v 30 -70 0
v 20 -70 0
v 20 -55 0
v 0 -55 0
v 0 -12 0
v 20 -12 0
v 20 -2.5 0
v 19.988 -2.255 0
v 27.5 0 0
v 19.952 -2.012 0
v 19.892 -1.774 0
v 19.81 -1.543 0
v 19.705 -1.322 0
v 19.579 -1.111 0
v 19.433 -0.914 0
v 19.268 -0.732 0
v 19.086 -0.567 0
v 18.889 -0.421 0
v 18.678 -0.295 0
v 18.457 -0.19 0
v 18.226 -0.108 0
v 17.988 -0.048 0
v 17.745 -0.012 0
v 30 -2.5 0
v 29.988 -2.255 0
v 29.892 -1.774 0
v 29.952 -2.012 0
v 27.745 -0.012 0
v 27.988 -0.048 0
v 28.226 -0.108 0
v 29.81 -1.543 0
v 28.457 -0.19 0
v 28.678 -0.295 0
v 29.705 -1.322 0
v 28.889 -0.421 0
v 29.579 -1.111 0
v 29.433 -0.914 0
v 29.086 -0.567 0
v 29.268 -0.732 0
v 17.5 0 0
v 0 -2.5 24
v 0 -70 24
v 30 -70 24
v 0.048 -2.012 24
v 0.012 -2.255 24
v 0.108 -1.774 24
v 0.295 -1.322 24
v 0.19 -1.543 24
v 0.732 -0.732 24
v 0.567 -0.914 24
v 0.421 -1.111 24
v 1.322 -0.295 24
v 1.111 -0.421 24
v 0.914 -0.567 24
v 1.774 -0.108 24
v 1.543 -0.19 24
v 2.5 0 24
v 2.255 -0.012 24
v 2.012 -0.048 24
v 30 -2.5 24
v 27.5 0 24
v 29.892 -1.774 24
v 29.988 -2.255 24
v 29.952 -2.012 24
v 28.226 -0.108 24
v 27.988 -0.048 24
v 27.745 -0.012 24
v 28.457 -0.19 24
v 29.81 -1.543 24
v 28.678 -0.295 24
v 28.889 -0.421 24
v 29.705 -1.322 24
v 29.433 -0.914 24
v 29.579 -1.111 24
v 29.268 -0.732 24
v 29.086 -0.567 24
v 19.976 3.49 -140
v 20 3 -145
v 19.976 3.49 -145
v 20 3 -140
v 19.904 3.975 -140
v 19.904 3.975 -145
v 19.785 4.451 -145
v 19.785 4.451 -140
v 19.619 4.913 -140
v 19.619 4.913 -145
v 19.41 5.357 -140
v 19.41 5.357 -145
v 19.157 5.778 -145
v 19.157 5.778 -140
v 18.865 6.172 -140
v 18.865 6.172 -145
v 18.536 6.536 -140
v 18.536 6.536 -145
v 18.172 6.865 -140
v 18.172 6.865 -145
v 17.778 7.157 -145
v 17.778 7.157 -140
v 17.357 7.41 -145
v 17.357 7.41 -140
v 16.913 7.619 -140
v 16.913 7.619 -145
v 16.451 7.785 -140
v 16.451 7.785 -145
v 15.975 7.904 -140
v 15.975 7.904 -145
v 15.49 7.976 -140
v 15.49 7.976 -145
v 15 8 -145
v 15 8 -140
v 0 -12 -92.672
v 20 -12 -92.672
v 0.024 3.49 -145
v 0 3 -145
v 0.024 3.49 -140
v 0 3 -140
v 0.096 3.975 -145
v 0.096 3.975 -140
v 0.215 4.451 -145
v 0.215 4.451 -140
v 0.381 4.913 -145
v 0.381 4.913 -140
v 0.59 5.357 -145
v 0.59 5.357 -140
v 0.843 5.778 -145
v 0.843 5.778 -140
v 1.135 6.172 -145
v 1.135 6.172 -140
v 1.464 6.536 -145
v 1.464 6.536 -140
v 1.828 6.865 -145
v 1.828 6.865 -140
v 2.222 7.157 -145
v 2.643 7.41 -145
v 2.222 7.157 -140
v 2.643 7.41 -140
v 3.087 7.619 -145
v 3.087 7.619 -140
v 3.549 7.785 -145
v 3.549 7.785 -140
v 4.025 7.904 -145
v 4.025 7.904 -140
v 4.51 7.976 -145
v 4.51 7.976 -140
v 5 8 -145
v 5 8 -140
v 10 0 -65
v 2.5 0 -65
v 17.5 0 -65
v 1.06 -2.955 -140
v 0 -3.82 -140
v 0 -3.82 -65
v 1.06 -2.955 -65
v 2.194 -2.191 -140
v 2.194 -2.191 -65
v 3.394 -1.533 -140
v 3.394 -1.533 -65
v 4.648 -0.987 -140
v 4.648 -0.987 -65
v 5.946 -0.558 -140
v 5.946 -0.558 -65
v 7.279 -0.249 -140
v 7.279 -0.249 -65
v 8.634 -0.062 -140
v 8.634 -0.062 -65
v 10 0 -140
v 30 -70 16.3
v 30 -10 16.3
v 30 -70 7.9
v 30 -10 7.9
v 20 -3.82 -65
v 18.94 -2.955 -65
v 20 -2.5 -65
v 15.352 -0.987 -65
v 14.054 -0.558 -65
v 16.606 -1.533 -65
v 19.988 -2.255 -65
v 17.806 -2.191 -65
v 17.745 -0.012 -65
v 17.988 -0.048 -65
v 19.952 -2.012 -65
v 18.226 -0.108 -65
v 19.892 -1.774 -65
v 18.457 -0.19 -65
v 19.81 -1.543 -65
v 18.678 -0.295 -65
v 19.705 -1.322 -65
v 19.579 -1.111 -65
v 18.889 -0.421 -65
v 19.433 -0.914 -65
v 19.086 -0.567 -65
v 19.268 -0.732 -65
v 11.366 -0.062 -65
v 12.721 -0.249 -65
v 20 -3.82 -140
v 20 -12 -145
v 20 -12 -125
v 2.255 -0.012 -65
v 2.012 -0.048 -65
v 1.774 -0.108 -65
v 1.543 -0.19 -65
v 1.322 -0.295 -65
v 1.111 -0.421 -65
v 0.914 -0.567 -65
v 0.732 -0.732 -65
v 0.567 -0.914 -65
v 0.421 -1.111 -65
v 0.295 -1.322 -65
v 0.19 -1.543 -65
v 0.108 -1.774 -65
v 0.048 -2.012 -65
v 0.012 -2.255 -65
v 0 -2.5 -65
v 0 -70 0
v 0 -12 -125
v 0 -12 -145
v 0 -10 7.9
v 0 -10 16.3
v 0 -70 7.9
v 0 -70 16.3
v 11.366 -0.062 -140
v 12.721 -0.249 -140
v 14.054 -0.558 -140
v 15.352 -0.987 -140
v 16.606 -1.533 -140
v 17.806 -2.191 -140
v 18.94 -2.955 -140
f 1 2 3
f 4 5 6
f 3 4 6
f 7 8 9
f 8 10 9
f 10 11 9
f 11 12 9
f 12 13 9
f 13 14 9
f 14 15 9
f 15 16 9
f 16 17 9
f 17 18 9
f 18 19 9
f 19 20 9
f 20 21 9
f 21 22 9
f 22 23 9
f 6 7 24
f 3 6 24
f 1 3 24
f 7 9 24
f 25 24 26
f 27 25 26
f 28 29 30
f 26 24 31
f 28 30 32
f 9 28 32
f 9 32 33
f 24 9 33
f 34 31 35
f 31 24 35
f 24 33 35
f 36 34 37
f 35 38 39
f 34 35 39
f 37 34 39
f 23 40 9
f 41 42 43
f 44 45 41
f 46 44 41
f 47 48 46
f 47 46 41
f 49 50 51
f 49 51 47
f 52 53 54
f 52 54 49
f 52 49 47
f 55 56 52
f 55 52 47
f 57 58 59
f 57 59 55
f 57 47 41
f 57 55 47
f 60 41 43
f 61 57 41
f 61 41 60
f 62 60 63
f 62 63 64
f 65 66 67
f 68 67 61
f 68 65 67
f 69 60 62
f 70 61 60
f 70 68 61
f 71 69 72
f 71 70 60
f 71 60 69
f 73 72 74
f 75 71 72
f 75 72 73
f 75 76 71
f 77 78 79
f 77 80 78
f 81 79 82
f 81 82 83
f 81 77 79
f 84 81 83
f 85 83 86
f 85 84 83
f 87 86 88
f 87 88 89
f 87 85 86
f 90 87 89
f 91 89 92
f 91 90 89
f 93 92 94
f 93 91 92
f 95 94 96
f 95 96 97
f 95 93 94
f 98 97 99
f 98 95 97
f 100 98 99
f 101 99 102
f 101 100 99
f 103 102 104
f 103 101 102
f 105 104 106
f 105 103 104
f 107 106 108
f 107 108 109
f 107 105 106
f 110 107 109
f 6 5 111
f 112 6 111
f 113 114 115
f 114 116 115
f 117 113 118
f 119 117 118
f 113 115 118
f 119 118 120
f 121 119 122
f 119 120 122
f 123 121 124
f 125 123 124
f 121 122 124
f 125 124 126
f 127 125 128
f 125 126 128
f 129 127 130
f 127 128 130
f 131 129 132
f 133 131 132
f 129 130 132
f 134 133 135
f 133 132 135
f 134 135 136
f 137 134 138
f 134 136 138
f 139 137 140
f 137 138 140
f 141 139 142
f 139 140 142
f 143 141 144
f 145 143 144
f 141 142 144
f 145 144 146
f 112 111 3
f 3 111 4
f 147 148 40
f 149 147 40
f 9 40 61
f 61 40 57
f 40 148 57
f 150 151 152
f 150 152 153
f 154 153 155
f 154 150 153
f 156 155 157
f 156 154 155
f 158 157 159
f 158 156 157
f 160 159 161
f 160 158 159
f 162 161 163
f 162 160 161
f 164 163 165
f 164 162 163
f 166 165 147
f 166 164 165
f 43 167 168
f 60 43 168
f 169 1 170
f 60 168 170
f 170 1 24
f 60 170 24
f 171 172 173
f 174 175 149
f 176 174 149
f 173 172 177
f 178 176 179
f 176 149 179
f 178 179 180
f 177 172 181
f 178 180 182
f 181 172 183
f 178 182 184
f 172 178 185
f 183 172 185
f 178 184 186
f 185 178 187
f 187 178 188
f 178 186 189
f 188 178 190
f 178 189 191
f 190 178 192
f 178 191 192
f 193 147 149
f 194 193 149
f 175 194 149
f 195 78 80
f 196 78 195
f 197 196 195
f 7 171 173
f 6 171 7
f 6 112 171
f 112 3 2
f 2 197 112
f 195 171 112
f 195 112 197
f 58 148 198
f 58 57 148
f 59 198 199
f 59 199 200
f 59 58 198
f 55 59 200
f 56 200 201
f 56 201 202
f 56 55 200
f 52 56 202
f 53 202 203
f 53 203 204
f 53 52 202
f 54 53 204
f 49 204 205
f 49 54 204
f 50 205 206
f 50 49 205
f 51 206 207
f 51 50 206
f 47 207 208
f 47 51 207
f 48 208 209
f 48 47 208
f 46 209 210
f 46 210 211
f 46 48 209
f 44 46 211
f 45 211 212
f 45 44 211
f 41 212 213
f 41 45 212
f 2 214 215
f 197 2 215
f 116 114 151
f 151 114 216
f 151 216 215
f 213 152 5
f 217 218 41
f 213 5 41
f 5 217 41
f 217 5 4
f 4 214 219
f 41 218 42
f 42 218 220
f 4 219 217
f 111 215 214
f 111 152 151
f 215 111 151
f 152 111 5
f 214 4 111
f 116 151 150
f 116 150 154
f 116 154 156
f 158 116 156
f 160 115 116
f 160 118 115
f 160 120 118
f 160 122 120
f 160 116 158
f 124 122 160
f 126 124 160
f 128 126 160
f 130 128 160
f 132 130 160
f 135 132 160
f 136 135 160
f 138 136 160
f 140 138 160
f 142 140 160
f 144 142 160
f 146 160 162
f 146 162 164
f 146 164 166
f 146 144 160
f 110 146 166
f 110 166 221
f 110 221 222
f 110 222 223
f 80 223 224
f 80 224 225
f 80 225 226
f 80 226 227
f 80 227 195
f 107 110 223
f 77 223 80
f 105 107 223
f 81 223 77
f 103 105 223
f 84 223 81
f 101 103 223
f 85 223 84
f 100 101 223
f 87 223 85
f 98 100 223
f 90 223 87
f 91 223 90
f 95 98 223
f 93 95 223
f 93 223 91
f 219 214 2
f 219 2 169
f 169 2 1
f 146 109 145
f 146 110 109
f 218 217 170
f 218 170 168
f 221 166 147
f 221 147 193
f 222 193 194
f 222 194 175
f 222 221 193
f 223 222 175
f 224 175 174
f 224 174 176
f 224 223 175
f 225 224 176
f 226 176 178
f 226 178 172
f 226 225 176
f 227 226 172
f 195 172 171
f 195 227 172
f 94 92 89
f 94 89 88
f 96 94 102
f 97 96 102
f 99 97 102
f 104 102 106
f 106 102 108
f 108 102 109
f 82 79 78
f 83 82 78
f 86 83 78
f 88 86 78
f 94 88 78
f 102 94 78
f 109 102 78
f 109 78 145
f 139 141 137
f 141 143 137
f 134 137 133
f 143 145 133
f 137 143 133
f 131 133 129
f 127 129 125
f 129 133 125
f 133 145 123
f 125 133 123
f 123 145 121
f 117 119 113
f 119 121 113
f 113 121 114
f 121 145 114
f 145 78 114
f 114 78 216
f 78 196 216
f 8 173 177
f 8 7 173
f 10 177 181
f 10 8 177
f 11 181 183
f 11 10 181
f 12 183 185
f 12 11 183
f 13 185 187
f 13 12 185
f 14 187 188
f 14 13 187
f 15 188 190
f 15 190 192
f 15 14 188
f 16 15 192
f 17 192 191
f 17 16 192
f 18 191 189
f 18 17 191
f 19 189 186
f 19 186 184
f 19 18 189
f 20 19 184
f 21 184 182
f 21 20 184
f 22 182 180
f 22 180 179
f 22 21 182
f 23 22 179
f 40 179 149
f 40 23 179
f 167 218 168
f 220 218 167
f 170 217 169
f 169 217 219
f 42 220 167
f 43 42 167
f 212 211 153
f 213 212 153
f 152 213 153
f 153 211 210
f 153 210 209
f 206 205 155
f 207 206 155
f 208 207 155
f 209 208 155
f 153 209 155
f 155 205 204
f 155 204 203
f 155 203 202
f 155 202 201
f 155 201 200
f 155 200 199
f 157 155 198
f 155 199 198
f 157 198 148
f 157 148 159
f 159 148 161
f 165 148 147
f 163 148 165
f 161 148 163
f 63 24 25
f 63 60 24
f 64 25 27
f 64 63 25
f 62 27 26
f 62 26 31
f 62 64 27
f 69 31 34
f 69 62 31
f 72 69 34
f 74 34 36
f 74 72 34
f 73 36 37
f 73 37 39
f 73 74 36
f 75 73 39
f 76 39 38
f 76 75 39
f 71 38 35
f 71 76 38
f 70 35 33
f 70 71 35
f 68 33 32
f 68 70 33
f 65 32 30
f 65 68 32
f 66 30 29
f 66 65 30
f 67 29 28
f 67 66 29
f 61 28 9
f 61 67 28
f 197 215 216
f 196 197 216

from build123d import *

# Parameters (mm, degrees)
F0_W     = 30
F0_H     = 70
F1_DEPTH = 24
F2_W     = 60
F2_H     = 8.4
F3_DEPTH = 30.001
F5_DEPTH = 20
F6_W     = 20
F6_H     = 5
F7_DEPTH = 8
F9_DEPTH = 75
F10_R    = 5
F11_R    = 2.5
F12_R    = 2.5


with BuildPart() as f1:
    # F0 (on Top) → F1 (new body)
    with BuildSketch(Plane.XY):
        with Locations((15, -35)):
            Rectangle(F0_W, F0_H)
    extrude(amount=F1_DEPTH)

    # F2 (on face) → F3 (cut, through all)
    with BuildSketch(Plane(origin=(0, 0, 0), x_dir=(0, -1, 0), z_dir=(-1, 0, 0))):
        with Locations((40, 12.1)):
            Rectangle(F2_W, F2_H)
    extrude(amount=-F3_DEPTH, mode=Mode.SUBTRACT)

    # F4 (on Right) → F5 (join)
    with BuildSketch(Plane.YZ):
        Polygon((0, -145), (0, 0), (-12, 0), (-12, -92.6724137931), (-12, -125), (-12, -145), align=None)
        Polygon((-12, -125), (-12, -92.6724137931), (-55, 0), (-70, 0), align=None)
    extrude(amount=F5_DEPTH)

    # F6 (on face) → F7 (join)
    with BuildSketch(Plane(origin=(0, 0, 0), x_dir=(-1, 0, 0), z_dir=(0, 1, 0))):
        with Locations((-10, -142.5)):
            Rectangle(F6_W, F6_H)
    extrude(amount=F7_DEPTH)

    # F8 (on face) → F9 (cut)
    with BuildSketch(Plane.XY.offset(-140)):
        with BuildLine():
            ThreePointArc((0, -3.8196601125), (4.647668654, -0.9874146153), (10.0000000012, 0))
            Line((10.0000000012, 0), (0, 0))
            Line((0, 0), (0, -3.8196601125))
        make_face()
        with BuildLine():
            ThreePointArc((10.0000000012, 0), (15.6425875311, -1.1017552924), (20.4562749714, -4.2451725387))
            Line((20.4562749714, -4.2451725387), (20.4562749714, 0))
            Line((20.4562749714, 0), (20, 0))
            Line((20, 0), (10.0000000012, 0))
        make_face()
    extrude(amount=F9_DEPTH, mode=Mode.SUBTRACT)

    # F10
    f10_edges = [f1.edges().sort_by_distance(p)[0] for p in [
        (0, 8, -142.5),
        (20, 8, -142.5),
    ]]
    fillet(f10_edges, radius=F10_R)

    # F11
    f11_edges = [f1.edges().sort_by_distance(p)[0] for p in [
        (0, 0, -20.5),
        (20, 0, -32.5),
    ]]
    fillet(f11_edges, radius=F11_R)

    # F12
    f12_edges = [f1.edges().sort_by_distance(p)[0] for p in [
        (30, 0, 12),
    ]]
    fillet(f12_edges, radius=F12_R)


solid = f1.part
